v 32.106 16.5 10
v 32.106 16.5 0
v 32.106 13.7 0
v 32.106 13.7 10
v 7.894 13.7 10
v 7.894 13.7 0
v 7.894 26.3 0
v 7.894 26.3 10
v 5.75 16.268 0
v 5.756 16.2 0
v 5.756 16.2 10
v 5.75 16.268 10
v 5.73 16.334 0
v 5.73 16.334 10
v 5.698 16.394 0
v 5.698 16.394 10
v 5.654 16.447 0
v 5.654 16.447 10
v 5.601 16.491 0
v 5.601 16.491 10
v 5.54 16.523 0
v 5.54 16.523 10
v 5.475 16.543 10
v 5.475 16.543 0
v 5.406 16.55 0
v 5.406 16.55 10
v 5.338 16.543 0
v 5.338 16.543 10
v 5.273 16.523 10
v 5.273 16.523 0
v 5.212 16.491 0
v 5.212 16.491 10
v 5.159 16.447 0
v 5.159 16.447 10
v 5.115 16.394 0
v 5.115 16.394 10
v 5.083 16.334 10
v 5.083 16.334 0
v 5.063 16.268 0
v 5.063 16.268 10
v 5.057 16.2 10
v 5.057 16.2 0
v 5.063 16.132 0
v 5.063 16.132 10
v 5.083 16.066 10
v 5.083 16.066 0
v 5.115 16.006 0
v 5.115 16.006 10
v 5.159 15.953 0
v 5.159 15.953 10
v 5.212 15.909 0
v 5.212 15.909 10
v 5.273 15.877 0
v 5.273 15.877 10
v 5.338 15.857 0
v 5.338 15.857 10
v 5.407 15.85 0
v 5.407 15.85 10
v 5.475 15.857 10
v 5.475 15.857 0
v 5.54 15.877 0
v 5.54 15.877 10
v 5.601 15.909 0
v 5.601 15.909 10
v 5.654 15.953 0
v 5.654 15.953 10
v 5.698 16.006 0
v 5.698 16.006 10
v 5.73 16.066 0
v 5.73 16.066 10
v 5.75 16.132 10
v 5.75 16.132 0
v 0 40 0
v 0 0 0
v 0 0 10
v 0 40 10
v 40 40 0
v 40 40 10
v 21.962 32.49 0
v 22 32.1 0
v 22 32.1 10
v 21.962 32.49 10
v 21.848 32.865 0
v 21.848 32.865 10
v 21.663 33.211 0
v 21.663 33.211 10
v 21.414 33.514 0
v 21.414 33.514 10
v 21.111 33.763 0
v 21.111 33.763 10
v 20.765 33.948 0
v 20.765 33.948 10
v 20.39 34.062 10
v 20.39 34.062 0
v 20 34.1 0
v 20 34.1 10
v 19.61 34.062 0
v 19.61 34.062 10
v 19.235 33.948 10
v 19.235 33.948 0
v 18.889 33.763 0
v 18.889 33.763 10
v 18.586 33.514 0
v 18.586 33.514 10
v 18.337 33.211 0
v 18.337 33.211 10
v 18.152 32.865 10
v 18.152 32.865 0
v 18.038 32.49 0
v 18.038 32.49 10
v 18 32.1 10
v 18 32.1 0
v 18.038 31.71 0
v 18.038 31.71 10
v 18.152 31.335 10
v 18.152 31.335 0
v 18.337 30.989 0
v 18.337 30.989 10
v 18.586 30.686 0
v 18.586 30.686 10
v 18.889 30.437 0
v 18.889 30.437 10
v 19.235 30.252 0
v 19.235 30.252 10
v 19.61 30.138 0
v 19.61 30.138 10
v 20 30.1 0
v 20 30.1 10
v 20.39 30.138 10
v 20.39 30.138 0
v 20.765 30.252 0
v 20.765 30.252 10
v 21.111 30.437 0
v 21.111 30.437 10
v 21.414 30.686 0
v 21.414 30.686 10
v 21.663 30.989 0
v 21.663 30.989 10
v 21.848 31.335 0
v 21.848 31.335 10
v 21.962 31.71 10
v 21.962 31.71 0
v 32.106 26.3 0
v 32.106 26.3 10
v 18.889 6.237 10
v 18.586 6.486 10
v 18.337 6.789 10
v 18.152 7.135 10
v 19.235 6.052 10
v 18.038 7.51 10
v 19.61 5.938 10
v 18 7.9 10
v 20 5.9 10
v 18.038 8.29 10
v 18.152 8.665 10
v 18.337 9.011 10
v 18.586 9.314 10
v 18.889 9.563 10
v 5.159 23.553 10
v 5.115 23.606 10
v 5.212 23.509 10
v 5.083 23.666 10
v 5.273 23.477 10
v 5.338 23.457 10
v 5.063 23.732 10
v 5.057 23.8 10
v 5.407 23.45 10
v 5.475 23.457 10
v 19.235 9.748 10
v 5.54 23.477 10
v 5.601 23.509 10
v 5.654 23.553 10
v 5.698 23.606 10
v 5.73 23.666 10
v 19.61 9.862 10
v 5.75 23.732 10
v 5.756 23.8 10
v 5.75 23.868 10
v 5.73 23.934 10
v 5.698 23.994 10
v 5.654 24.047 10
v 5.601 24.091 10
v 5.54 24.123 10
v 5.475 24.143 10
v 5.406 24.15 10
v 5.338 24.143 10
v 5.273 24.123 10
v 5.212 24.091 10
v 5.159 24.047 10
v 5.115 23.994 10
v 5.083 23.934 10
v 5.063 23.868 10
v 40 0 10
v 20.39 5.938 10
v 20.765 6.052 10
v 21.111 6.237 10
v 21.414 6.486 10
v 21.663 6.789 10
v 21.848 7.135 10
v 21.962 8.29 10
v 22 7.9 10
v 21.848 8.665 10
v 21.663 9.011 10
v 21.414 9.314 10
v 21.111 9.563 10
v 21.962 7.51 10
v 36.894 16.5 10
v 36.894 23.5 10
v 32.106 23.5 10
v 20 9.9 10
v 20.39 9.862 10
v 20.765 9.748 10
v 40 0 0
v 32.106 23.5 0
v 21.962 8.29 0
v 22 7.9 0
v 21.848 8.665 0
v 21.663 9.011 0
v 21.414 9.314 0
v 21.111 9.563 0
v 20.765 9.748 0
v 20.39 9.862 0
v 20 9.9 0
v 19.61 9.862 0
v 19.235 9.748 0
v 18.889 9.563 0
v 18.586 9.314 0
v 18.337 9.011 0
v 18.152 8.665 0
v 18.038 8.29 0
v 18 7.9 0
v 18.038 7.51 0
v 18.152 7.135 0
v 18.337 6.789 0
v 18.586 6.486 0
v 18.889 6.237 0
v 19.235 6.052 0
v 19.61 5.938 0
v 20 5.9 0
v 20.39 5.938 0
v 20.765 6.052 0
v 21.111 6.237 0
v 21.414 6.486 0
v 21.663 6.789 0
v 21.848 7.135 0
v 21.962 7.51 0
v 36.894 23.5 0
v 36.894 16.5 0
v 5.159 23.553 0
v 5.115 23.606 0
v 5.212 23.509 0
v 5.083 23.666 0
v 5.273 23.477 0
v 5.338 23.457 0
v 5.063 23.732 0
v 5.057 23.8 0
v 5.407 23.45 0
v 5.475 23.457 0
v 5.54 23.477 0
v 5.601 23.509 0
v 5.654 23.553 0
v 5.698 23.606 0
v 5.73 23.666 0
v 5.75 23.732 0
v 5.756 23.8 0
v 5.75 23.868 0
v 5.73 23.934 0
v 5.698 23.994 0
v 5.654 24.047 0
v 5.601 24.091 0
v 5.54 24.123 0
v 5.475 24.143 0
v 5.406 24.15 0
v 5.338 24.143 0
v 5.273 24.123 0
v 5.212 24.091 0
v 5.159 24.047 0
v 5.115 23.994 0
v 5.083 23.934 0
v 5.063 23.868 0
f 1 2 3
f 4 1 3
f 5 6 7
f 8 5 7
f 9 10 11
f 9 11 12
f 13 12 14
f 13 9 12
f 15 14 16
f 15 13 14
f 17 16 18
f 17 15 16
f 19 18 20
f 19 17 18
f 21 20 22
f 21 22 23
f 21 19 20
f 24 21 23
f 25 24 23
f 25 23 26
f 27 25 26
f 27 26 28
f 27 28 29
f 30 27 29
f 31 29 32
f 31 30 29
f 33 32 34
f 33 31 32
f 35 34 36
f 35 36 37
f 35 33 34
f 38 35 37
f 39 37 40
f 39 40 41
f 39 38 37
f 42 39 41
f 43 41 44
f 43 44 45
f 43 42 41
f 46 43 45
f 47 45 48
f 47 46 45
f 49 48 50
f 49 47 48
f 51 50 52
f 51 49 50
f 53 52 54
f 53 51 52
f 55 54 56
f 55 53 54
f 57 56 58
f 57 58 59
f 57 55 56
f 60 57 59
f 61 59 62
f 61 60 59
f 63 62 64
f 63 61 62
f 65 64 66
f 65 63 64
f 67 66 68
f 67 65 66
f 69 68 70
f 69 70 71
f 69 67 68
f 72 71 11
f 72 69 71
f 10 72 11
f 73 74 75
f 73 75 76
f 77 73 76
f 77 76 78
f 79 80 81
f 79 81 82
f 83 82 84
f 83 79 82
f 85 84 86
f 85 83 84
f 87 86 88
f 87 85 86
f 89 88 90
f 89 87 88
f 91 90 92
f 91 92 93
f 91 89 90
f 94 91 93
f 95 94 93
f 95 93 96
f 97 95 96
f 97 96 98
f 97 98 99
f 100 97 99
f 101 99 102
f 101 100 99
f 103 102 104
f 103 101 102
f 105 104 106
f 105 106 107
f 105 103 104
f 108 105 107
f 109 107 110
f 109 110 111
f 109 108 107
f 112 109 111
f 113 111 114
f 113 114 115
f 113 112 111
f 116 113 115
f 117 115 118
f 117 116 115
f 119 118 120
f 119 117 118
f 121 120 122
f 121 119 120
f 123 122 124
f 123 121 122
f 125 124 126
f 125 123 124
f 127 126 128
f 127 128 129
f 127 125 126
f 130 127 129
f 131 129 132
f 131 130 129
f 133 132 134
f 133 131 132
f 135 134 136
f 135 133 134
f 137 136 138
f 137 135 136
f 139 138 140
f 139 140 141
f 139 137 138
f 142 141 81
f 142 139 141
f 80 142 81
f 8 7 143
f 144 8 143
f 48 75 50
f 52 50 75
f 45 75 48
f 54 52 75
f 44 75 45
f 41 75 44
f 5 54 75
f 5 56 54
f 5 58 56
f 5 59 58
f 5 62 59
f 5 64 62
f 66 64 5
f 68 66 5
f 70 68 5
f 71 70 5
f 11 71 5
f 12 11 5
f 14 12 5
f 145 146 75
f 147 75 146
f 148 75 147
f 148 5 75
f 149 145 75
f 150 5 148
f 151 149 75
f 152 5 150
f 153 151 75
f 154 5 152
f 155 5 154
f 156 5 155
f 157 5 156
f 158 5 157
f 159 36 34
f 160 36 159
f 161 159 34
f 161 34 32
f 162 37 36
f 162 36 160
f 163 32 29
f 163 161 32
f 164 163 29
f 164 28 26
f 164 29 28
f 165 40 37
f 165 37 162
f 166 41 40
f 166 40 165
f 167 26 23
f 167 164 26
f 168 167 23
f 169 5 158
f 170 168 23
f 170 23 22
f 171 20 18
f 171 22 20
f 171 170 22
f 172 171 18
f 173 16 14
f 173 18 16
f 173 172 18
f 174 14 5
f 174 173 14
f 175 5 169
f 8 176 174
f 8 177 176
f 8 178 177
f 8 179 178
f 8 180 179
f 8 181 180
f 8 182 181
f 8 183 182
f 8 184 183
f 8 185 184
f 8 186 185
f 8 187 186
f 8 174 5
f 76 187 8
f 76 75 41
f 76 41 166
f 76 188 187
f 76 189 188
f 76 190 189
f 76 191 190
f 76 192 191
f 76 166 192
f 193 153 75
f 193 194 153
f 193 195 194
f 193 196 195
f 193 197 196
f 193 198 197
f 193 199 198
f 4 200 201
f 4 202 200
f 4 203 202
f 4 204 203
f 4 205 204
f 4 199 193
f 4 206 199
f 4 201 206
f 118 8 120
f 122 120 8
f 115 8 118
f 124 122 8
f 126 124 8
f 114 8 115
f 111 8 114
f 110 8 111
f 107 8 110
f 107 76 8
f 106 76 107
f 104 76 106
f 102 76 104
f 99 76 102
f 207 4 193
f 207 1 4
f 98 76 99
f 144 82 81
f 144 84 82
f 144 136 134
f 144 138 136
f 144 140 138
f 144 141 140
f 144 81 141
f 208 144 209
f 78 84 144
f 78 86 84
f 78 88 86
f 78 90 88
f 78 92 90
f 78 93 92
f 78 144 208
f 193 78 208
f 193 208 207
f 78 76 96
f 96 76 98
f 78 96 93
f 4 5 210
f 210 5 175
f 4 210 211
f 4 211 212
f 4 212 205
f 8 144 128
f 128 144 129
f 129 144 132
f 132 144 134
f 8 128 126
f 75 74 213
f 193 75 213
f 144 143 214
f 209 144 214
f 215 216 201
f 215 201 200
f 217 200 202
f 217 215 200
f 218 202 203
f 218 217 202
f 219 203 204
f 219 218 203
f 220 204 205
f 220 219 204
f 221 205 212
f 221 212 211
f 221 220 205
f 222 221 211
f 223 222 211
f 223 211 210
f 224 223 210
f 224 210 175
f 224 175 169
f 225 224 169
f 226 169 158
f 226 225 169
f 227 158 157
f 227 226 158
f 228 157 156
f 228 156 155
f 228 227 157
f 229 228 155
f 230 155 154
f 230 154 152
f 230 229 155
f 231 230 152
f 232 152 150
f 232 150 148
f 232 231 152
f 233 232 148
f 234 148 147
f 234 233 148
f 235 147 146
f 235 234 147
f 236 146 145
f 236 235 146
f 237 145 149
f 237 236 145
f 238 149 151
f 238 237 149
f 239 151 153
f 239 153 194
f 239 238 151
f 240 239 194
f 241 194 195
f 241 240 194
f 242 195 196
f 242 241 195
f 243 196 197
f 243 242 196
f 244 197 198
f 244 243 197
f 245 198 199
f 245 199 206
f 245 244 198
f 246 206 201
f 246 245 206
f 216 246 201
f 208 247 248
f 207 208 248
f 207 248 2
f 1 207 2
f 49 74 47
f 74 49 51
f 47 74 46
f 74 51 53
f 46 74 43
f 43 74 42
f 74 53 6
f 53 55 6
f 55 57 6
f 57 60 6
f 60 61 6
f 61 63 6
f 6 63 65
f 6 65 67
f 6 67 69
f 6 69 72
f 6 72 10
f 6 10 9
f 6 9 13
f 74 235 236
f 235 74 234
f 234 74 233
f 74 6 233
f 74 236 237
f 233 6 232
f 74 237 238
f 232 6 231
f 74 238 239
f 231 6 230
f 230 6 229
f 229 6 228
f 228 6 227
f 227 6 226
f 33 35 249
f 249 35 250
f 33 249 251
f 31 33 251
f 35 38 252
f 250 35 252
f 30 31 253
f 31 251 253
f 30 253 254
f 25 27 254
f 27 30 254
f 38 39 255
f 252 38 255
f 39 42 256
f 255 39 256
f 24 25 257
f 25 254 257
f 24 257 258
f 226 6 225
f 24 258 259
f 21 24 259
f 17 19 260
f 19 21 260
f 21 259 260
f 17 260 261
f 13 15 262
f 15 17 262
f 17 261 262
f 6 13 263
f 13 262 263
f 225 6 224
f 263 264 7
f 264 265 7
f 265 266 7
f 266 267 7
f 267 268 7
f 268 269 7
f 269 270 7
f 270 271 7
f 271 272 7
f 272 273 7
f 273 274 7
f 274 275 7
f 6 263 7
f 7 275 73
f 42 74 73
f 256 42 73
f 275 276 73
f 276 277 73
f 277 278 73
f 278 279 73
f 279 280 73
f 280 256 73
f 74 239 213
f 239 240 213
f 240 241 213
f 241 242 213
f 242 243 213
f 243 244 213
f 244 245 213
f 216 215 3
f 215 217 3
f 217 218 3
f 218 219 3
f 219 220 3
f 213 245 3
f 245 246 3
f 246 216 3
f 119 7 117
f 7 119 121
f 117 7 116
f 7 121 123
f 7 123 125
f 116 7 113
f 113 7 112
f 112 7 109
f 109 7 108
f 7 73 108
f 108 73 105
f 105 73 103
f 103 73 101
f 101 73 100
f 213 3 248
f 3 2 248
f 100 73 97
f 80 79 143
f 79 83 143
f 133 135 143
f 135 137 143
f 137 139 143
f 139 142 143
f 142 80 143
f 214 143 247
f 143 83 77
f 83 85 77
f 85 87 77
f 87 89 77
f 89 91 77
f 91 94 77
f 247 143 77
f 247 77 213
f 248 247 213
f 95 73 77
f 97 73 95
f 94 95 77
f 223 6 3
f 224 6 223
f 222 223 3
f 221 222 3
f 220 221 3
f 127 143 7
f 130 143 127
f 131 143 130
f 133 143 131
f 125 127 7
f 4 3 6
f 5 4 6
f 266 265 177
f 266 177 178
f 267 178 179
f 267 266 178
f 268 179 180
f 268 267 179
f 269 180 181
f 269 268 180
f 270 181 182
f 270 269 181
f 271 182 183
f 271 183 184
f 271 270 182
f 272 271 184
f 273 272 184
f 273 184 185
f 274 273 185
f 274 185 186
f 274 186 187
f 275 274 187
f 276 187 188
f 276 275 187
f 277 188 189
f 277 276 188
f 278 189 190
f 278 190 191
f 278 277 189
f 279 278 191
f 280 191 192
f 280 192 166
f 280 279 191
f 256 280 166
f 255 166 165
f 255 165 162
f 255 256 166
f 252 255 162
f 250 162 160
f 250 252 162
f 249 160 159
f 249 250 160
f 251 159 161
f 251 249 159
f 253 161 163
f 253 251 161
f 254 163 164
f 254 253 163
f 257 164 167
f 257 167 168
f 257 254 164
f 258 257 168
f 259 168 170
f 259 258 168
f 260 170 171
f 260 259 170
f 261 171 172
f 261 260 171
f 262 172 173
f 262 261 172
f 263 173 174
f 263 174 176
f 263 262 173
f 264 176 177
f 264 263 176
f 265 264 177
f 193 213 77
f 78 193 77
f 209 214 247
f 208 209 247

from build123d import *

# Parameters (mm, degrees)
F0_W     = 40
F0_H     = 40
F0_R     = 0.35
F0_R_2   = 2
F1_DEPTH = 10


with BuildPart() as f1:
    # F0 (on Top) → F1 (new body)
    with BuildSketch(Plane.XY):
        with Locations((20, 20)):
            Rectangle(F0_W, F0_H)
        with Locations((5.4065, 16.2)):
            Circle(F0_R, mode=Mode.SUBTRACT)
        with Locations((20, 7.9)):
            Circle(F0_R_2, mode=Mode.SUBTRACT)
        with Locations((5.4065, 23.8)):
            Circle(F0_R, mode=Mode.SUBTRACT)
        Polygon((7.8935, 13.7), (7.8935, 26.3), (32.1065, 26.3), (32.1065, 23.5), (36.8935, 23.5), (36.8935, 16.5), (32.1065, 16.5), (32.1065, 13.7), align=None, mode=Mode.SUBTRACT)
        with Locations((20, 32.1)):
            Circle(F0_R_2, mode=Mode.SUBTRACT)
    extrude(amount=F1_DEPTH)


solid = f1.part
